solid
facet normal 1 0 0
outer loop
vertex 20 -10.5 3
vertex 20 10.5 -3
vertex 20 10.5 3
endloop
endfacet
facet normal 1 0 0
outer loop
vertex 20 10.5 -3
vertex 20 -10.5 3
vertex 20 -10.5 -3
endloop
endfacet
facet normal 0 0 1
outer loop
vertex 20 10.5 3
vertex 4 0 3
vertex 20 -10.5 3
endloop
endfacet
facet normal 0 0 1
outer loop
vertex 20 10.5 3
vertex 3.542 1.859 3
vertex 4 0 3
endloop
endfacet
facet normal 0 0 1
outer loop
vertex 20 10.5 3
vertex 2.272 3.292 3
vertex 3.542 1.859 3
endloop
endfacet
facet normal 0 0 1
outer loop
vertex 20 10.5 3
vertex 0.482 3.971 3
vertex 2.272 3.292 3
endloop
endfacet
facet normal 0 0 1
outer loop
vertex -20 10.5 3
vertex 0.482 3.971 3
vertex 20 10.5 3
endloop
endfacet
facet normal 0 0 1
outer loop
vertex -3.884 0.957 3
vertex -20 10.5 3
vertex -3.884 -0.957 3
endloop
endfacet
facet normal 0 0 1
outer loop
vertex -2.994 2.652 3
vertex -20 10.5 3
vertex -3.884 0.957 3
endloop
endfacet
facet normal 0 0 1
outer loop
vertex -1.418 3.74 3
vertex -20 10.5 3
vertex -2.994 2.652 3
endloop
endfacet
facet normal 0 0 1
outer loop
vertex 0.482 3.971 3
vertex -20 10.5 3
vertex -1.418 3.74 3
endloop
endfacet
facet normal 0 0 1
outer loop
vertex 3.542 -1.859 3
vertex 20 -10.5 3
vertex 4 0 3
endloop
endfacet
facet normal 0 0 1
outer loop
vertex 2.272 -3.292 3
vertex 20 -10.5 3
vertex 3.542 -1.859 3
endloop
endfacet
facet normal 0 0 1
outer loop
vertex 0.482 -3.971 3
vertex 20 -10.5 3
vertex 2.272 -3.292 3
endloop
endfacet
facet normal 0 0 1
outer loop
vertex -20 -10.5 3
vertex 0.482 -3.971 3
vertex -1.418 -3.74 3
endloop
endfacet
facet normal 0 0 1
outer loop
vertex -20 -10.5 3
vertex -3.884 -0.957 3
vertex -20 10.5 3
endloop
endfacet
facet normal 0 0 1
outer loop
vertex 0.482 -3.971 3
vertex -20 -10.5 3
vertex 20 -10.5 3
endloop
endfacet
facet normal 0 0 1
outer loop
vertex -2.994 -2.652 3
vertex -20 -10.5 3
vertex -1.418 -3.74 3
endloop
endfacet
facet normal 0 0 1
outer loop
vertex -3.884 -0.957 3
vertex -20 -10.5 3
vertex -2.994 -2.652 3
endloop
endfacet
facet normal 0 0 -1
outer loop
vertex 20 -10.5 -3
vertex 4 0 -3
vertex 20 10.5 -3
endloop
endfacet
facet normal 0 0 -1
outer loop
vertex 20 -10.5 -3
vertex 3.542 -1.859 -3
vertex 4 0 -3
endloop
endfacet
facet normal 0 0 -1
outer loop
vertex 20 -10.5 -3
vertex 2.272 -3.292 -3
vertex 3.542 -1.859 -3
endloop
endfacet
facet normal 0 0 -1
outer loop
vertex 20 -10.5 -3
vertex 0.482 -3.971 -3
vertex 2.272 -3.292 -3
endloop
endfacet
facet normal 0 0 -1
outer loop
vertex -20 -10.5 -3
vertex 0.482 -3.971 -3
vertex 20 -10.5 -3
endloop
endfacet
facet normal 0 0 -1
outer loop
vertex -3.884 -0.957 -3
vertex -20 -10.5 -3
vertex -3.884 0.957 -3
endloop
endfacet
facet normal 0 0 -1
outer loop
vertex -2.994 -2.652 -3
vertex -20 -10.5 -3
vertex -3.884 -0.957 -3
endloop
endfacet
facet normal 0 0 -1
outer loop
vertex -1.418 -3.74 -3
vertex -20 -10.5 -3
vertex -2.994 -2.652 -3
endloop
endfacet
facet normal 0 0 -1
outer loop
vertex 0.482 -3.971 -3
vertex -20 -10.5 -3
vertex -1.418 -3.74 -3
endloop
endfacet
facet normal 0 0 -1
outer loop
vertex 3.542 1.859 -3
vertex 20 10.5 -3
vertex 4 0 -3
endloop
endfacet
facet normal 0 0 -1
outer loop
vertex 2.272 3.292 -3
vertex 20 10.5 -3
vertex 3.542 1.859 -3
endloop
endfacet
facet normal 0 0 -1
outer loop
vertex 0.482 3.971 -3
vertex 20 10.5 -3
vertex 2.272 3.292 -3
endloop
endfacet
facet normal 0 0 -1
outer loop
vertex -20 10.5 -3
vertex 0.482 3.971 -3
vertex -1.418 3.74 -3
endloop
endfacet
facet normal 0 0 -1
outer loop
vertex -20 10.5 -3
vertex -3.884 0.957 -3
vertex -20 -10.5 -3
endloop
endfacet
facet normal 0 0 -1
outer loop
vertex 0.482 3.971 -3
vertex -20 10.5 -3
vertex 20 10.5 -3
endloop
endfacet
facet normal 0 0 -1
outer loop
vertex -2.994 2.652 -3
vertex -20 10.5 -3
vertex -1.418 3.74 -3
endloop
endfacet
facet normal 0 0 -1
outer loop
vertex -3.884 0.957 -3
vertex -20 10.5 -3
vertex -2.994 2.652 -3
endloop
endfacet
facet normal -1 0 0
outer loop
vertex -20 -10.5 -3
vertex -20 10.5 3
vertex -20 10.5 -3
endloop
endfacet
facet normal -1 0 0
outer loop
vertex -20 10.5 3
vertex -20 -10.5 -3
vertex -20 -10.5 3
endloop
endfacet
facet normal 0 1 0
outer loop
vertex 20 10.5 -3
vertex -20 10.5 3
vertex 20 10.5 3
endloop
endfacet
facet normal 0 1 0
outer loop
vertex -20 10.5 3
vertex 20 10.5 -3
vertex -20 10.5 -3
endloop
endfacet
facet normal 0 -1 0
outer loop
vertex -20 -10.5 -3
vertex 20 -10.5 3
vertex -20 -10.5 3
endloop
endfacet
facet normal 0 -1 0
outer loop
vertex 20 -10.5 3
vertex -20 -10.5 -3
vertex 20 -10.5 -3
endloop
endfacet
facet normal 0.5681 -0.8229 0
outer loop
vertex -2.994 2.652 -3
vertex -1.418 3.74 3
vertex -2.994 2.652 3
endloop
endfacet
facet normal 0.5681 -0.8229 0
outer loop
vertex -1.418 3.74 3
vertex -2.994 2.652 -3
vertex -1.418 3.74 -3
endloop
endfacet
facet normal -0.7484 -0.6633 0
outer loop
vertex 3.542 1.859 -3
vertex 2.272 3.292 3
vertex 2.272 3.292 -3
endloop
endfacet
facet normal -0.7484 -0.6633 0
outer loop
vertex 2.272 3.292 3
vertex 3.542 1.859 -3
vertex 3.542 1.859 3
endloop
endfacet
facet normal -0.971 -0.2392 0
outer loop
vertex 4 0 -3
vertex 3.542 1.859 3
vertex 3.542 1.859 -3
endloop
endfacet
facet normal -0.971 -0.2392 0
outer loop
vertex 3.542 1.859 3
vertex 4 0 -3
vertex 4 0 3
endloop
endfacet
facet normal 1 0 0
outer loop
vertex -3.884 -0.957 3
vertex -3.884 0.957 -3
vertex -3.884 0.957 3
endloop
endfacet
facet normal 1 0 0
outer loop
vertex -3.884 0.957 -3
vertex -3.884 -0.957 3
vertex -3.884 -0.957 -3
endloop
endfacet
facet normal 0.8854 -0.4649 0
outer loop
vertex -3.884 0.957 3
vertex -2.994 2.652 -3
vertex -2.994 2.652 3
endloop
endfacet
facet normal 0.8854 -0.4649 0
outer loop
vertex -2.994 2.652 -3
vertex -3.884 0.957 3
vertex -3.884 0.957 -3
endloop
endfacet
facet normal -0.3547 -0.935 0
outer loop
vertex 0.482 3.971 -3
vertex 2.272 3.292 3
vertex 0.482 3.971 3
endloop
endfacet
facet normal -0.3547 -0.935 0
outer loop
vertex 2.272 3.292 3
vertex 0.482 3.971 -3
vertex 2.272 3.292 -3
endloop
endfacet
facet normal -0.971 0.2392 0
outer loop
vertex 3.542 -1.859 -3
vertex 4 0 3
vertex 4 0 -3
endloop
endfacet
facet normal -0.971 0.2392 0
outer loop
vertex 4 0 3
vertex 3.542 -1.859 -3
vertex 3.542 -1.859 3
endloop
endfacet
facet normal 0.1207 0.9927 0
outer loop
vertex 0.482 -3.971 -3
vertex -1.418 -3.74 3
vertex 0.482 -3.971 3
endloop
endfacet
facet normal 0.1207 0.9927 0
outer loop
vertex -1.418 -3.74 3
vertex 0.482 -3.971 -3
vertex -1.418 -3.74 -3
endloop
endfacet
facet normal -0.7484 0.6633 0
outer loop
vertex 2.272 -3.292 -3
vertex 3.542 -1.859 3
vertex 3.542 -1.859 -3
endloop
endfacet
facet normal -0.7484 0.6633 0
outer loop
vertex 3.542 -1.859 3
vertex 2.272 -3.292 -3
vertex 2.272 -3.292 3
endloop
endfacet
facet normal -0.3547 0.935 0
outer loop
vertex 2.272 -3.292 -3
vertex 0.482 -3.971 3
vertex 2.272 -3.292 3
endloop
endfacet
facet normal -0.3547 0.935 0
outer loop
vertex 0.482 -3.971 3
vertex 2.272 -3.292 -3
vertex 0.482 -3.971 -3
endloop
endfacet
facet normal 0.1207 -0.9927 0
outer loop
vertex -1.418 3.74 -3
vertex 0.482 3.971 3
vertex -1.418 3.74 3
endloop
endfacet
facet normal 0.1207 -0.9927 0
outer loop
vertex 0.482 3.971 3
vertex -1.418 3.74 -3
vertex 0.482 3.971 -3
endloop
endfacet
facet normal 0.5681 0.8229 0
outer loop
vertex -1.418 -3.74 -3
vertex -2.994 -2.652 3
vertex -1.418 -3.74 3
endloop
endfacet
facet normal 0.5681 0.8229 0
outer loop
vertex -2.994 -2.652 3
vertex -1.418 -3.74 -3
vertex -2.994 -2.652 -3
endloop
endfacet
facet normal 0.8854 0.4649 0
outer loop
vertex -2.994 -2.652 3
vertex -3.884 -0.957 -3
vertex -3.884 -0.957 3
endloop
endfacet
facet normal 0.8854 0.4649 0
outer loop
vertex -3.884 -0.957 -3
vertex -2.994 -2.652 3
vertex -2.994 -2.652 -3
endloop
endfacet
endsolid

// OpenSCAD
HottubRailSpacer(40, 21, 6);

module HottubRailSpacer(width, length, height) {
    difference() {
        cube([width, length, height], center=true);
        cylinder(r=4, h=2*height, center=true);
    }
    
}
